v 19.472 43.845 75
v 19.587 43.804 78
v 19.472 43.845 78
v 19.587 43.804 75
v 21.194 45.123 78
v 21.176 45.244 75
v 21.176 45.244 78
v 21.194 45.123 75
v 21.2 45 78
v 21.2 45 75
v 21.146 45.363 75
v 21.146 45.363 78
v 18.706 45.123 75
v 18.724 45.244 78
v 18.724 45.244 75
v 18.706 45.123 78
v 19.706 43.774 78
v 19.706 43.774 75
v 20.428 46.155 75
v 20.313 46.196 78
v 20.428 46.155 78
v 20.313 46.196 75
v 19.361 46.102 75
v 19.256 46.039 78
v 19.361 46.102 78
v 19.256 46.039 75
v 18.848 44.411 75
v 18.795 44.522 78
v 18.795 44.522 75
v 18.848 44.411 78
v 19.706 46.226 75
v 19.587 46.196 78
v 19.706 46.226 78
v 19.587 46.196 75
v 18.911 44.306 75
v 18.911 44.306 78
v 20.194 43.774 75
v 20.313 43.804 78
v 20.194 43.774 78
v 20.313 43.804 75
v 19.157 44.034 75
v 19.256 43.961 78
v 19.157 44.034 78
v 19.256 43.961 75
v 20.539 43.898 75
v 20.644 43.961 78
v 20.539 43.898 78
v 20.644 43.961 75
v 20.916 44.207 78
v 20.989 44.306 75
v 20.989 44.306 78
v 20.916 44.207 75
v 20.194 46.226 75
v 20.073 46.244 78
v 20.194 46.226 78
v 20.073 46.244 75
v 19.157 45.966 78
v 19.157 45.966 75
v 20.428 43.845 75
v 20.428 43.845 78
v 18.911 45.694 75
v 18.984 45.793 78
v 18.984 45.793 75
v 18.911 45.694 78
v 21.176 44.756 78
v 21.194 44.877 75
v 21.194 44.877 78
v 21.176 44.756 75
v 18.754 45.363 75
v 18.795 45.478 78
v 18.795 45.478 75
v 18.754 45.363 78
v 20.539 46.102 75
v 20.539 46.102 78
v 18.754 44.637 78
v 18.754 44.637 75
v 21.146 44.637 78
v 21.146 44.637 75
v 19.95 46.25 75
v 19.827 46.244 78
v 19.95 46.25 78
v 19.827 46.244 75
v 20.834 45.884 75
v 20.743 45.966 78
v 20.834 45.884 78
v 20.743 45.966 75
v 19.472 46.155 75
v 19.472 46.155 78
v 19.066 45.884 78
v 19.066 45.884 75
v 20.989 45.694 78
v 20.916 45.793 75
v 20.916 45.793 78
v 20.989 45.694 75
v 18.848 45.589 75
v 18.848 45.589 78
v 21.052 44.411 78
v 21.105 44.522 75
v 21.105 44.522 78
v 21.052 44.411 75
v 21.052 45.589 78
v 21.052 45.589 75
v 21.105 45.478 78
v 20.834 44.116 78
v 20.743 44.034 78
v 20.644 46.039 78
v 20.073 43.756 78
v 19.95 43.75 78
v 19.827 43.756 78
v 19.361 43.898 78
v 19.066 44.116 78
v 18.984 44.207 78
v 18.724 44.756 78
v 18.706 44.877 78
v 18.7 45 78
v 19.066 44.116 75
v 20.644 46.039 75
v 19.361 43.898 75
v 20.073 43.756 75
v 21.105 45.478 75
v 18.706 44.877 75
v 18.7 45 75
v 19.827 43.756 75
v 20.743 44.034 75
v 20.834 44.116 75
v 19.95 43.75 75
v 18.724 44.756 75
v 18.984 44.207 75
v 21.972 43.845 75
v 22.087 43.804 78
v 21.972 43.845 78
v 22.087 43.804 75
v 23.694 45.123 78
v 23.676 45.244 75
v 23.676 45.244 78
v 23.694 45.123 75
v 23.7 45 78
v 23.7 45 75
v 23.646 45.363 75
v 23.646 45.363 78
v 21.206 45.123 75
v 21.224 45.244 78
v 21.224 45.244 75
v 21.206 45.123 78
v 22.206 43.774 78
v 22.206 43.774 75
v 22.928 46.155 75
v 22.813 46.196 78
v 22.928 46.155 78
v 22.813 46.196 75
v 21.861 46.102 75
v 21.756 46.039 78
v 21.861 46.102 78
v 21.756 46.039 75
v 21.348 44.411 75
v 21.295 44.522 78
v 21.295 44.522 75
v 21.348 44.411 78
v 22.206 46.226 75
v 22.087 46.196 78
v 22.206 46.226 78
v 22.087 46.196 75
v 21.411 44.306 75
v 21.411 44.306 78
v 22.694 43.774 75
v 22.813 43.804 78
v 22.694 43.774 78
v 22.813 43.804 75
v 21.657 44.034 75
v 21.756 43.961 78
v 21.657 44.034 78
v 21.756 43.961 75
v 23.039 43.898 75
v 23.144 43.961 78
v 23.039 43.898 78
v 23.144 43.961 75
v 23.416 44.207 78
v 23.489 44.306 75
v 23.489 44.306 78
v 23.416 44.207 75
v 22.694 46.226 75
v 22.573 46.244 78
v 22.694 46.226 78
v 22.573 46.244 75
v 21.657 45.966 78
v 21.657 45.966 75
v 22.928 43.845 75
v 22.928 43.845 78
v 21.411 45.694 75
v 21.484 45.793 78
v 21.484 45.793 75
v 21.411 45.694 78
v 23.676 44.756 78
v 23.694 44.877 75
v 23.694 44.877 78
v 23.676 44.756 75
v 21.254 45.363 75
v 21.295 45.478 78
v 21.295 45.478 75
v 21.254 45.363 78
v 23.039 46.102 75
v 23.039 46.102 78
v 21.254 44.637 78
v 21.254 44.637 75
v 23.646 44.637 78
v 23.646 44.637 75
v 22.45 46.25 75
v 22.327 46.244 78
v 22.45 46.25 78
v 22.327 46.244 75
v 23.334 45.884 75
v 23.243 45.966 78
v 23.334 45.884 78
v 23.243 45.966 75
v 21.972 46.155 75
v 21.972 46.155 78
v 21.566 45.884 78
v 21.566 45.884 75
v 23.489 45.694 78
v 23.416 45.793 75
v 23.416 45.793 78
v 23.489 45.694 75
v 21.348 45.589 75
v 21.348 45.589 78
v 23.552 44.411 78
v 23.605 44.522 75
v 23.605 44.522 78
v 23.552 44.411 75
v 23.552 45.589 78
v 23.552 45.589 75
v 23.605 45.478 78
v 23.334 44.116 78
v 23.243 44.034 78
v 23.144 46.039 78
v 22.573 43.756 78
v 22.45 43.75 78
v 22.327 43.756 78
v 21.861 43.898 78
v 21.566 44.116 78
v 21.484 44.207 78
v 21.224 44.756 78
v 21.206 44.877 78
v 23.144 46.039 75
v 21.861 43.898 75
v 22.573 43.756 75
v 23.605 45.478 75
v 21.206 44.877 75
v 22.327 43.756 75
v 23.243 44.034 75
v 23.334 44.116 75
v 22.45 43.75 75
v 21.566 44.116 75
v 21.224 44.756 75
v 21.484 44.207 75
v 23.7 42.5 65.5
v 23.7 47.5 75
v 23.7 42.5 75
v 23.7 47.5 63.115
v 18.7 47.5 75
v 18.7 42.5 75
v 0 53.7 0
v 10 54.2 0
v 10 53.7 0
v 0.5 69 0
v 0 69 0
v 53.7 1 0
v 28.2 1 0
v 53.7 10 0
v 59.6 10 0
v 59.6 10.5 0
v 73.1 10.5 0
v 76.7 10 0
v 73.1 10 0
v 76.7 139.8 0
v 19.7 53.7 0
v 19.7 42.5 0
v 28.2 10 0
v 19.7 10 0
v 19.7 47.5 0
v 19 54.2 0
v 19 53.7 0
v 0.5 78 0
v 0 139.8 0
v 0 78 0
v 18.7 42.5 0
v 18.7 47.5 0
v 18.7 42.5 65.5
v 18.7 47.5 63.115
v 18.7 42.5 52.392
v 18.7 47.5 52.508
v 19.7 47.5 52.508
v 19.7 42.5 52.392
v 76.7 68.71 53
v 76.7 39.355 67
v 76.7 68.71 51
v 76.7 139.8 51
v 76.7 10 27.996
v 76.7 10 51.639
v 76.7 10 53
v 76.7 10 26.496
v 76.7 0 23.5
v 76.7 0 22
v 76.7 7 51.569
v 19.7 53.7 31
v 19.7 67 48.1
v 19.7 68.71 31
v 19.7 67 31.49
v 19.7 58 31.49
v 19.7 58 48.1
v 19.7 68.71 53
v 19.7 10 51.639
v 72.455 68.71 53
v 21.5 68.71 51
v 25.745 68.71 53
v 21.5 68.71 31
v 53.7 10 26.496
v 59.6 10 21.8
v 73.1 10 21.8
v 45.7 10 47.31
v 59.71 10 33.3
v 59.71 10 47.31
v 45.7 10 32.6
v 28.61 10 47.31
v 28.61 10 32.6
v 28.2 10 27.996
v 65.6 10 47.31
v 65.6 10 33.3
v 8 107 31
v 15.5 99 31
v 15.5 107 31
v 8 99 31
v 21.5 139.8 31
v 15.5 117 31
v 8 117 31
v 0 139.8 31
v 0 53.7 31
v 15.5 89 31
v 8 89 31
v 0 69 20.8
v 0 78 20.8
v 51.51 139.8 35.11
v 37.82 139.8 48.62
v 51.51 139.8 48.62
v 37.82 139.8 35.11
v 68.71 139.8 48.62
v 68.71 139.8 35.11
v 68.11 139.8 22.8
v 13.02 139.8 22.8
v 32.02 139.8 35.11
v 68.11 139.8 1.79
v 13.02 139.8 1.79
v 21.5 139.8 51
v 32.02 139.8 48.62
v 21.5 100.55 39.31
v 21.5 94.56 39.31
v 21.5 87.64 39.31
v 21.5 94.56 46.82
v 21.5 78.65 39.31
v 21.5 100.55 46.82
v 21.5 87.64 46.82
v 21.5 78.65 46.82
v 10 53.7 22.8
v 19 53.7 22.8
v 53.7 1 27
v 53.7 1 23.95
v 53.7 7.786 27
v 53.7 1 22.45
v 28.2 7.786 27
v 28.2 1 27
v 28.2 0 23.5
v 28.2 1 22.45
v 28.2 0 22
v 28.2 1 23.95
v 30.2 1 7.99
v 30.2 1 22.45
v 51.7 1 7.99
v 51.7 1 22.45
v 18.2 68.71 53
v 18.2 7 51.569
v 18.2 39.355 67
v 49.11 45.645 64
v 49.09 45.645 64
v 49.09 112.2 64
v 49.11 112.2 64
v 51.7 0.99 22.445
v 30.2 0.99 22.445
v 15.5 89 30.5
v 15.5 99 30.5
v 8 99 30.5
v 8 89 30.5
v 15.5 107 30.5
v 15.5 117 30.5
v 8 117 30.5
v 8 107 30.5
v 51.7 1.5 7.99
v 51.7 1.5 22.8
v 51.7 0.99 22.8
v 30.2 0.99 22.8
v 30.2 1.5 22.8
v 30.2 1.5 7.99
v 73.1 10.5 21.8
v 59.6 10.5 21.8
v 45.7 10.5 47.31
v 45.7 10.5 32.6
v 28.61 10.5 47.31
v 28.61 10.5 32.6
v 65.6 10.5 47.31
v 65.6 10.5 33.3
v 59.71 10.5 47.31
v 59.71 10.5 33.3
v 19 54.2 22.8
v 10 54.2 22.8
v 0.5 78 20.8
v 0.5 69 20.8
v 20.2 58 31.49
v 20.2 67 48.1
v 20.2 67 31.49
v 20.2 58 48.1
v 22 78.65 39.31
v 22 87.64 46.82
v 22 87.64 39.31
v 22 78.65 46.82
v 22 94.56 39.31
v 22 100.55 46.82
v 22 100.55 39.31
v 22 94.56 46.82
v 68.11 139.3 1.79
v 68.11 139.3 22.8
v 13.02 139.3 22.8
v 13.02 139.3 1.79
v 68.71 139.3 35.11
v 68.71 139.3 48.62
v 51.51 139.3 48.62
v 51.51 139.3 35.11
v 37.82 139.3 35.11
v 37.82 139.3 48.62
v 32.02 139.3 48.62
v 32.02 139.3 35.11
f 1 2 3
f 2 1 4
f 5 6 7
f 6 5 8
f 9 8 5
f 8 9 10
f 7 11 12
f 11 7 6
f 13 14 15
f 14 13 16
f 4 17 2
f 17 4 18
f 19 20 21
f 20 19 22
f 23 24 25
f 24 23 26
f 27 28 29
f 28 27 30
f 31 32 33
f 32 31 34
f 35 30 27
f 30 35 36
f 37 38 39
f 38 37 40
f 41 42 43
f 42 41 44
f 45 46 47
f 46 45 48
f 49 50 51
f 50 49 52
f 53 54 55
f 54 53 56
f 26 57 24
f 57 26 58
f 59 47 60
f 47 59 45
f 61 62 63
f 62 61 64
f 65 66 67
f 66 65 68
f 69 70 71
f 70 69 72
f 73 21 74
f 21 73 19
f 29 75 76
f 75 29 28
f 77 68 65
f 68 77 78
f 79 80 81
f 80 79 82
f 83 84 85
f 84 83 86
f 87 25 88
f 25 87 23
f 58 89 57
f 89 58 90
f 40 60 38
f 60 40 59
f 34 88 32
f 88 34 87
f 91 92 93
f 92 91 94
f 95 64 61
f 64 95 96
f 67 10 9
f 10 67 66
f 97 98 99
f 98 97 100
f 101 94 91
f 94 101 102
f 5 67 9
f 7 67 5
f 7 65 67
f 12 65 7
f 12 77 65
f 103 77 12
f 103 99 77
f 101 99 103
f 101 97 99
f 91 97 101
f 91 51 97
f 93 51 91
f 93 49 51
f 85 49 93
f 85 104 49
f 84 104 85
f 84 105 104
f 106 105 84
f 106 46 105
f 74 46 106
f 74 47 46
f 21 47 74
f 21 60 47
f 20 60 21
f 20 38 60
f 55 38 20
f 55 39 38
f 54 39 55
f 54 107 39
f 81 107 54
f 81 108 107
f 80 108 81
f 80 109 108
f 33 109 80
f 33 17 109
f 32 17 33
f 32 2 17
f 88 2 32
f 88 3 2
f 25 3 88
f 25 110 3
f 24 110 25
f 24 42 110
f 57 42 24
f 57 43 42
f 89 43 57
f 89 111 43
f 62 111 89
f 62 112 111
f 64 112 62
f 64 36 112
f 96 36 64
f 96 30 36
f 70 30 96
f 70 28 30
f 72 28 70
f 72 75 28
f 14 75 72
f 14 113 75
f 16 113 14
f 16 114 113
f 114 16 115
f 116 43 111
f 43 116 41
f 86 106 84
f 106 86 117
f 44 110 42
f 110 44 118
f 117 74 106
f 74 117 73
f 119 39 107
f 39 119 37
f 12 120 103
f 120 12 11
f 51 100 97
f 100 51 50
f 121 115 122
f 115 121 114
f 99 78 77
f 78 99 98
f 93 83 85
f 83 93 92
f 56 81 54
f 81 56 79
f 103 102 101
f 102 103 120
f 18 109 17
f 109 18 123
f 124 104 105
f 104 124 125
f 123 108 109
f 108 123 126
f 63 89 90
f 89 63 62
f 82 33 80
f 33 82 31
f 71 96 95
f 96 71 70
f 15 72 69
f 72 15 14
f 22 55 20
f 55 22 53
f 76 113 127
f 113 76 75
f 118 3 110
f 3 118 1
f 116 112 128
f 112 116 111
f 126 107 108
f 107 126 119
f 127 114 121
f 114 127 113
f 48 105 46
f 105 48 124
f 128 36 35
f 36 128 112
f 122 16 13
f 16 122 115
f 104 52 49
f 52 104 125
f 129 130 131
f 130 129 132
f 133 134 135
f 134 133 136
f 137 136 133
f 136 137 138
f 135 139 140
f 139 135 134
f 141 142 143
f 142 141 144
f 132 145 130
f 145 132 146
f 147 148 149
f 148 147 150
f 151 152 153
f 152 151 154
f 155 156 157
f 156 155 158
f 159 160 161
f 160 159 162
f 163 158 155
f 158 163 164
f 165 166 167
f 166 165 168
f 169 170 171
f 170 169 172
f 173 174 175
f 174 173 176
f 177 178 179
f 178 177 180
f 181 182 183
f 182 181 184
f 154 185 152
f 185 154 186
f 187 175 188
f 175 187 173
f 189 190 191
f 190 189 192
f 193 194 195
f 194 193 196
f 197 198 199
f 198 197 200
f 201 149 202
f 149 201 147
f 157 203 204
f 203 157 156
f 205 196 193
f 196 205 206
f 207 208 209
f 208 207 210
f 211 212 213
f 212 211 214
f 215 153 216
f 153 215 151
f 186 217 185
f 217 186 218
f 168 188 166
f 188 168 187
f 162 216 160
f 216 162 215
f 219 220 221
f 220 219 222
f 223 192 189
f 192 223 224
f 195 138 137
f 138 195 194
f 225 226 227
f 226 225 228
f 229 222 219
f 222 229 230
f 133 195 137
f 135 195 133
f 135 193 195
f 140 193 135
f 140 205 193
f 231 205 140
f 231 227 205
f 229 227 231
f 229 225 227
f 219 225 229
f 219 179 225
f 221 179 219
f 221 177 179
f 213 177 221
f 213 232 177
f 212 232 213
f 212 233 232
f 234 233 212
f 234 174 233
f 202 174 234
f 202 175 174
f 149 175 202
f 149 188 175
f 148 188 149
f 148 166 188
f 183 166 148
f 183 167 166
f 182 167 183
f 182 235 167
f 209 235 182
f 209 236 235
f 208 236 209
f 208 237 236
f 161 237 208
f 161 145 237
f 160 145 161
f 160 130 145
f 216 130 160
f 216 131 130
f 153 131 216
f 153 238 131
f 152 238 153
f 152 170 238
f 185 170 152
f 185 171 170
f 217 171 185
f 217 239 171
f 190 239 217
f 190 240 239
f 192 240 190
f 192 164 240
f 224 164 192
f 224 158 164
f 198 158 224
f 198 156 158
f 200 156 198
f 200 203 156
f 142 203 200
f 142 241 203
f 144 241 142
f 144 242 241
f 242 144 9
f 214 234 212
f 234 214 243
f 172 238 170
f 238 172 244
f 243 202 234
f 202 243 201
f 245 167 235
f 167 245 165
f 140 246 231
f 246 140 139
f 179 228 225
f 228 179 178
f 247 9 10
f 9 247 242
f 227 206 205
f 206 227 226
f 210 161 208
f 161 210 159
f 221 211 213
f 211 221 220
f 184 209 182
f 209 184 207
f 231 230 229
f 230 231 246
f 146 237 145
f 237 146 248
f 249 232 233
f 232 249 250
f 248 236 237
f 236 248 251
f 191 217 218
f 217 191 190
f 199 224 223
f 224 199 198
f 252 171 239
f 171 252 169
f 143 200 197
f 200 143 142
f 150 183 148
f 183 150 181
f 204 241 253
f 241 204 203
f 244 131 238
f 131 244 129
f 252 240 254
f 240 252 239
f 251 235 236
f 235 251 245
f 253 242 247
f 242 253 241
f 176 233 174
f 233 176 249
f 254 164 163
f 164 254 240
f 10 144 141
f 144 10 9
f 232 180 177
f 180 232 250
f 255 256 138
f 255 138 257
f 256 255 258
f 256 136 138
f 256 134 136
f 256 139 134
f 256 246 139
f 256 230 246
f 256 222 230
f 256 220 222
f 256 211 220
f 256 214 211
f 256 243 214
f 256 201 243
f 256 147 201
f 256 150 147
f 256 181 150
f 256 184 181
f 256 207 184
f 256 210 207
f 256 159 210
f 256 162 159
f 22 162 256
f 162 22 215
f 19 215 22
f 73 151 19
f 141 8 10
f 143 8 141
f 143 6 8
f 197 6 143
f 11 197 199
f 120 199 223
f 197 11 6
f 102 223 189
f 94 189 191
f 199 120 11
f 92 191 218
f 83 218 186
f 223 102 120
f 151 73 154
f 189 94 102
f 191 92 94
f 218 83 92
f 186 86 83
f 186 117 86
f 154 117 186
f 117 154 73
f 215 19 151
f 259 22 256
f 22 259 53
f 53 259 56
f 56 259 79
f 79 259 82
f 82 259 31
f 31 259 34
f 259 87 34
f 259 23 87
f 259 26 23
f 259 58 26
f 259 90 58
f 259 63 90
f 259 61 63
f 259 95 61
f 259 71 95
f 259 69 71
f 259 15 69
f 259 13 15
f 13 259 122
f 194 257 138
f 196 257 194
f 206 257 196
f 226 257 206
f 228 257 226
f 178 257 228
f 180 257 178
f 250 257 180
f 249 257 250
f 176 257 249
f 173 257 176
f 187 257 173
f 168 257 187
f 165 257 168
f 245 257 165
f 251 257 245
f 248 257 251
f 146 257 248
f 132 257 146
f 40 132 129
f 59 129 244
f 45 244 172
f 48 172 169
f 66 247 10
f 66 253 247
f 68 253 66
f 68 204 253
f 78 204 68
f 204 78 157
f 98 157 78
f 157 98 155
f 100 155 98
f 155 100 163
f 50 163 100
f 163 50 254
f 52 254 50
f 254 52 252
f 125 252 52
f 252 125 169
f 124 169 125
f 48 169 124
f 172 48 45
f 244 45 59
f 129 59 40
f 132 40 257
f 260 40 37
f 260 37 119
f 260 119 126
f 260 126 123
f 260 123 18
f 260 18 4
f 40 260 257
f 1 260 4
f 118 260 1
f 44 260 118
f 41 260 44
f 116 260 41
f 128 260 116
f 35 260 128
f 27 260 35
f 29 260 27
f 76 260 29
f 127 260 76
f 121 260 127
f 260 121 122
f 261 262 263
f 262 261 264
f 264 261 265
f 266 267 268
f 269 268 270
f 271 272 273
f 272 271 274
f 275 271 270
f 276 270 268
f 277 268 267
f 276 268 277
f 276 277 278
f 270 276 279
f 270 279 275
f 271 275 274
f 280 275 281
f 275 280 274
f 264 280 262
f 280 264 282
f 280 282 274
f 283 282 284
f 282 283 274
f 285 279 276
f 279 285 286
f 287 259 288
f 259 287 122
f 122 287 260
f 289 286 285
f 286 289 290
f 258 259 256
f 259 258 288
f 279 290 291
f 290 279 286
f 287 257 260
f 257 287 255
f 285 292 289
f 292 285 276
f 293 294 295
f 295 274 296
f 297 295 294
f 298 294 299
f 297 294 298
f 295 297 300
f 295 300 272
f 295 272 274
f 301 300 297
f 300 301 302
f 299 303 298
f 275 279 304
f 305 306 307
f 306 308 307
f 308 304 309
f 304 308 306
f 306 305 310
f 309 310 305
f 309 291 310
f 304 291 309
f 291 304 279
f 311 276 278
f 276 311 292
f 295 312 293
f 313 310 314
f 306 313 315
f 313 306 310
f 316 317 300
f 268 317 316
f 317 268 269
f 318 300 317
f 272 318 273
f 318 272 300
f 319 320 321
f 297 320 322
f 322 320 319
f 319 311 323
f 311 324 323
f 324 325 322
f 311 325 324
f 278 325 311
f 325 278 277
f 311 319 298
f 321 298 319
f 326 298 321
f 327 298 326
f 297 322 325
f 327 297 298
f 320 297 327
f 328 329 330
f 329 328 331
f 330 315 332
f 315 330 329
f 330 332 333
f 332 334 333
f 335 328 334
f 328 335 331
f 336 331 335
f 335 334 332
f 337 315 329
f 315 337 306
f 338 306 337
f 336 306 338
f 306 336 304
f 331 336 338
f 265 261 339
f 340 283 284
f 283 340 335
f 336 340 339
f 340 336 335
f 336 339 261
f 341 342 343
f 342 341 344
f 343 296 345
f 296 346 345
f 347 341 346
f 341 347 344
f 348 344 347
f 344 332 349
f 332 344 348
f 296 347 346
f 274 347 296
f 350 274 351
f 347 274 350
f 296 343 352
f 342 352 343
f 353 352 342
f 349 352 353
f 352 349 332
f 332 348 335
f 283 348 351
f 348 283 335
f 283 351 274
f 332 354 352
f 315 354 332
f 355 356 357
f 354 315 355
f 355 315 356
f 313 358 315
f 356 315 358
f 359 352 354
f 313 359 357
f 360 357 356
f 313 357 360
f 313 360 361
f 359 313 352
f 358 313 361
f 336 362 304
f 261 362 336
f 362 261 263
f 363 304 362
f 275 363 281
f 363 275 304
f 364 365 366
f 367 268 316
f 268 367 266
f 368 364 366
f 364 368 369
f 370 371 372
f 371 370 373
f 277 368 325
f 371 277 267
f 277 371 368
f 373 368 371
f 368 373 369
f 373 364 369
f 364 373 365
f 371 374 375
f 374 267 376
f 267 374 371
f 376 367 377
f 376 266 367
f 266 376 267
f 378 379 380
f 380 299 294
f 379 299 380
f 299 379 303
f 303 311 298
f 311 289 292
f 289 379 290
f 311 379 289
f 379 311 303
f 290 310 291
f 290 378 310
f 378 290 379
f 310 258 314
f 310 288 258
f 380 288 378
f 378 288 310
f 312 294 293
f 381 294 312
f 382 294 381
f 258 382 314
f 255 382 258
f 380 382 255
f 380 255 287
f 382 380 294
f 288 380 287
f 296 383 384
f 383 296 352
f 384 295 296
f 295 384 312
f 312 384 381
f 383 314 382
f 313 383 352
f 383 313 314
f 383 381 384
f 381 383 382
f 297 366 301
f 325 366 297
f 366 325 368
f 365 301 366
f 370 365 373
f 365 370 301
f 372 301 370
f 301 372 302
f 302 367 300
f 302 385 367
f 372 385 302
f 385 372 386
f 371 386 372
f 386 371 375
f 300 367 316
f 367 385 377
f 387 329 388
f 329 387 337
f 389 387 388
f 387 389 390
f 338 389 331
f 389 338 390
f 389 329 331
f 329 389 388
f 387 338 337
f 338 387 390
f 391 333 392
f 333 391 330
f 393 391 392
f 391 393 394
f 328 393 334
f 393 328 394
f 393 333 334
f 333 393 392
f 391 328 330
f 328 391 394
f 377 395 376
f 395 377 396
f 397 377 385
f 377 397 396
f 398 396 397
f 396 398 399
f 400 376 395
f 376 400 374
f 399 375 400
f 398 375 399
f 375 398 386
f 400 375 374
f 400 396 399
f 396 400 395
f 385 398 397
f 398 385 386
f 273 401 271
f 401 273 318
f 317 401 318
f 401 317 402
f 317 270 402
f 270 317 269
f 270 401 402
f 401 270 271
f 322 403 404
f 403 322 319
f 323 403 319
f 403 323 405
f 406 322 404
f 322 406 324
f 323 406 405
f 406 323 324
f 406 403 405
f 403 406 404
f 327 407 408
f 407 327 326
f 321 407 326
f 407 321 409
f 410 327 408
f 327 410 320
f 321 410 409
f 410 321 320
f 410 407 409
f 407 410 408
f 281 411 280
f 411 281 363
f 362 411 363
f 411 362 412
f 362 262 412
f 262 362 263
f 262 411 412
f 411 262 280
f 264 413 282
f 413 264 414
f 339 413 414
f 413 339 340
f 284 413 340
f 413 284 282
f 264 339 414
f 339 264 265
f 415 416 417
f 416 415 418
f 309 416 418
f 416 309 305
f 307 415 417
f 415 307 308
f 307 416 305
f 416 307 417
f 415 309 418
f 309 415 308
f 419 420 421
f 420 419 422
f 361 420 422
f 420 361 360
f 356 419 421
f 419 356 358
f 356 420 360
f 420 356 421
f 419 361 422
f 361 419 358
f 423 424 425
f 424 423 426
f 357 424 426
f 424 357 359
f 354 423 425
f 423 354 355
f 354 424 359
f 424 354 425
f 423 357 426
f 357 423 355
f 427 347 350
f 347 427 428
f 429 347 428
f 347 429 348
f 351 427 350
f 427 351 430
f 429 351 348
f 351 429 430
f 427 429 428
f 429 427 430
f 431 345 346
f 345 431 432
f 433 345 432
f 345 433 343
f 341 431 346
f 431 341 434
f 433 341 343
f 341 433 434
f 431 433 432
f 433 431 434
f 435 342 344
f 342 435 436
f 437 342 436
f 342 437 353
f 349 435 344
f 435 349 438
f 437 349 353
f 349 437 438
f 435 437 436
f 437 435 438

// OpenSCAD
include <_home_model.scad>

scale(s) translate([-rear_x0, -canopy_y, 0]) house_real();
